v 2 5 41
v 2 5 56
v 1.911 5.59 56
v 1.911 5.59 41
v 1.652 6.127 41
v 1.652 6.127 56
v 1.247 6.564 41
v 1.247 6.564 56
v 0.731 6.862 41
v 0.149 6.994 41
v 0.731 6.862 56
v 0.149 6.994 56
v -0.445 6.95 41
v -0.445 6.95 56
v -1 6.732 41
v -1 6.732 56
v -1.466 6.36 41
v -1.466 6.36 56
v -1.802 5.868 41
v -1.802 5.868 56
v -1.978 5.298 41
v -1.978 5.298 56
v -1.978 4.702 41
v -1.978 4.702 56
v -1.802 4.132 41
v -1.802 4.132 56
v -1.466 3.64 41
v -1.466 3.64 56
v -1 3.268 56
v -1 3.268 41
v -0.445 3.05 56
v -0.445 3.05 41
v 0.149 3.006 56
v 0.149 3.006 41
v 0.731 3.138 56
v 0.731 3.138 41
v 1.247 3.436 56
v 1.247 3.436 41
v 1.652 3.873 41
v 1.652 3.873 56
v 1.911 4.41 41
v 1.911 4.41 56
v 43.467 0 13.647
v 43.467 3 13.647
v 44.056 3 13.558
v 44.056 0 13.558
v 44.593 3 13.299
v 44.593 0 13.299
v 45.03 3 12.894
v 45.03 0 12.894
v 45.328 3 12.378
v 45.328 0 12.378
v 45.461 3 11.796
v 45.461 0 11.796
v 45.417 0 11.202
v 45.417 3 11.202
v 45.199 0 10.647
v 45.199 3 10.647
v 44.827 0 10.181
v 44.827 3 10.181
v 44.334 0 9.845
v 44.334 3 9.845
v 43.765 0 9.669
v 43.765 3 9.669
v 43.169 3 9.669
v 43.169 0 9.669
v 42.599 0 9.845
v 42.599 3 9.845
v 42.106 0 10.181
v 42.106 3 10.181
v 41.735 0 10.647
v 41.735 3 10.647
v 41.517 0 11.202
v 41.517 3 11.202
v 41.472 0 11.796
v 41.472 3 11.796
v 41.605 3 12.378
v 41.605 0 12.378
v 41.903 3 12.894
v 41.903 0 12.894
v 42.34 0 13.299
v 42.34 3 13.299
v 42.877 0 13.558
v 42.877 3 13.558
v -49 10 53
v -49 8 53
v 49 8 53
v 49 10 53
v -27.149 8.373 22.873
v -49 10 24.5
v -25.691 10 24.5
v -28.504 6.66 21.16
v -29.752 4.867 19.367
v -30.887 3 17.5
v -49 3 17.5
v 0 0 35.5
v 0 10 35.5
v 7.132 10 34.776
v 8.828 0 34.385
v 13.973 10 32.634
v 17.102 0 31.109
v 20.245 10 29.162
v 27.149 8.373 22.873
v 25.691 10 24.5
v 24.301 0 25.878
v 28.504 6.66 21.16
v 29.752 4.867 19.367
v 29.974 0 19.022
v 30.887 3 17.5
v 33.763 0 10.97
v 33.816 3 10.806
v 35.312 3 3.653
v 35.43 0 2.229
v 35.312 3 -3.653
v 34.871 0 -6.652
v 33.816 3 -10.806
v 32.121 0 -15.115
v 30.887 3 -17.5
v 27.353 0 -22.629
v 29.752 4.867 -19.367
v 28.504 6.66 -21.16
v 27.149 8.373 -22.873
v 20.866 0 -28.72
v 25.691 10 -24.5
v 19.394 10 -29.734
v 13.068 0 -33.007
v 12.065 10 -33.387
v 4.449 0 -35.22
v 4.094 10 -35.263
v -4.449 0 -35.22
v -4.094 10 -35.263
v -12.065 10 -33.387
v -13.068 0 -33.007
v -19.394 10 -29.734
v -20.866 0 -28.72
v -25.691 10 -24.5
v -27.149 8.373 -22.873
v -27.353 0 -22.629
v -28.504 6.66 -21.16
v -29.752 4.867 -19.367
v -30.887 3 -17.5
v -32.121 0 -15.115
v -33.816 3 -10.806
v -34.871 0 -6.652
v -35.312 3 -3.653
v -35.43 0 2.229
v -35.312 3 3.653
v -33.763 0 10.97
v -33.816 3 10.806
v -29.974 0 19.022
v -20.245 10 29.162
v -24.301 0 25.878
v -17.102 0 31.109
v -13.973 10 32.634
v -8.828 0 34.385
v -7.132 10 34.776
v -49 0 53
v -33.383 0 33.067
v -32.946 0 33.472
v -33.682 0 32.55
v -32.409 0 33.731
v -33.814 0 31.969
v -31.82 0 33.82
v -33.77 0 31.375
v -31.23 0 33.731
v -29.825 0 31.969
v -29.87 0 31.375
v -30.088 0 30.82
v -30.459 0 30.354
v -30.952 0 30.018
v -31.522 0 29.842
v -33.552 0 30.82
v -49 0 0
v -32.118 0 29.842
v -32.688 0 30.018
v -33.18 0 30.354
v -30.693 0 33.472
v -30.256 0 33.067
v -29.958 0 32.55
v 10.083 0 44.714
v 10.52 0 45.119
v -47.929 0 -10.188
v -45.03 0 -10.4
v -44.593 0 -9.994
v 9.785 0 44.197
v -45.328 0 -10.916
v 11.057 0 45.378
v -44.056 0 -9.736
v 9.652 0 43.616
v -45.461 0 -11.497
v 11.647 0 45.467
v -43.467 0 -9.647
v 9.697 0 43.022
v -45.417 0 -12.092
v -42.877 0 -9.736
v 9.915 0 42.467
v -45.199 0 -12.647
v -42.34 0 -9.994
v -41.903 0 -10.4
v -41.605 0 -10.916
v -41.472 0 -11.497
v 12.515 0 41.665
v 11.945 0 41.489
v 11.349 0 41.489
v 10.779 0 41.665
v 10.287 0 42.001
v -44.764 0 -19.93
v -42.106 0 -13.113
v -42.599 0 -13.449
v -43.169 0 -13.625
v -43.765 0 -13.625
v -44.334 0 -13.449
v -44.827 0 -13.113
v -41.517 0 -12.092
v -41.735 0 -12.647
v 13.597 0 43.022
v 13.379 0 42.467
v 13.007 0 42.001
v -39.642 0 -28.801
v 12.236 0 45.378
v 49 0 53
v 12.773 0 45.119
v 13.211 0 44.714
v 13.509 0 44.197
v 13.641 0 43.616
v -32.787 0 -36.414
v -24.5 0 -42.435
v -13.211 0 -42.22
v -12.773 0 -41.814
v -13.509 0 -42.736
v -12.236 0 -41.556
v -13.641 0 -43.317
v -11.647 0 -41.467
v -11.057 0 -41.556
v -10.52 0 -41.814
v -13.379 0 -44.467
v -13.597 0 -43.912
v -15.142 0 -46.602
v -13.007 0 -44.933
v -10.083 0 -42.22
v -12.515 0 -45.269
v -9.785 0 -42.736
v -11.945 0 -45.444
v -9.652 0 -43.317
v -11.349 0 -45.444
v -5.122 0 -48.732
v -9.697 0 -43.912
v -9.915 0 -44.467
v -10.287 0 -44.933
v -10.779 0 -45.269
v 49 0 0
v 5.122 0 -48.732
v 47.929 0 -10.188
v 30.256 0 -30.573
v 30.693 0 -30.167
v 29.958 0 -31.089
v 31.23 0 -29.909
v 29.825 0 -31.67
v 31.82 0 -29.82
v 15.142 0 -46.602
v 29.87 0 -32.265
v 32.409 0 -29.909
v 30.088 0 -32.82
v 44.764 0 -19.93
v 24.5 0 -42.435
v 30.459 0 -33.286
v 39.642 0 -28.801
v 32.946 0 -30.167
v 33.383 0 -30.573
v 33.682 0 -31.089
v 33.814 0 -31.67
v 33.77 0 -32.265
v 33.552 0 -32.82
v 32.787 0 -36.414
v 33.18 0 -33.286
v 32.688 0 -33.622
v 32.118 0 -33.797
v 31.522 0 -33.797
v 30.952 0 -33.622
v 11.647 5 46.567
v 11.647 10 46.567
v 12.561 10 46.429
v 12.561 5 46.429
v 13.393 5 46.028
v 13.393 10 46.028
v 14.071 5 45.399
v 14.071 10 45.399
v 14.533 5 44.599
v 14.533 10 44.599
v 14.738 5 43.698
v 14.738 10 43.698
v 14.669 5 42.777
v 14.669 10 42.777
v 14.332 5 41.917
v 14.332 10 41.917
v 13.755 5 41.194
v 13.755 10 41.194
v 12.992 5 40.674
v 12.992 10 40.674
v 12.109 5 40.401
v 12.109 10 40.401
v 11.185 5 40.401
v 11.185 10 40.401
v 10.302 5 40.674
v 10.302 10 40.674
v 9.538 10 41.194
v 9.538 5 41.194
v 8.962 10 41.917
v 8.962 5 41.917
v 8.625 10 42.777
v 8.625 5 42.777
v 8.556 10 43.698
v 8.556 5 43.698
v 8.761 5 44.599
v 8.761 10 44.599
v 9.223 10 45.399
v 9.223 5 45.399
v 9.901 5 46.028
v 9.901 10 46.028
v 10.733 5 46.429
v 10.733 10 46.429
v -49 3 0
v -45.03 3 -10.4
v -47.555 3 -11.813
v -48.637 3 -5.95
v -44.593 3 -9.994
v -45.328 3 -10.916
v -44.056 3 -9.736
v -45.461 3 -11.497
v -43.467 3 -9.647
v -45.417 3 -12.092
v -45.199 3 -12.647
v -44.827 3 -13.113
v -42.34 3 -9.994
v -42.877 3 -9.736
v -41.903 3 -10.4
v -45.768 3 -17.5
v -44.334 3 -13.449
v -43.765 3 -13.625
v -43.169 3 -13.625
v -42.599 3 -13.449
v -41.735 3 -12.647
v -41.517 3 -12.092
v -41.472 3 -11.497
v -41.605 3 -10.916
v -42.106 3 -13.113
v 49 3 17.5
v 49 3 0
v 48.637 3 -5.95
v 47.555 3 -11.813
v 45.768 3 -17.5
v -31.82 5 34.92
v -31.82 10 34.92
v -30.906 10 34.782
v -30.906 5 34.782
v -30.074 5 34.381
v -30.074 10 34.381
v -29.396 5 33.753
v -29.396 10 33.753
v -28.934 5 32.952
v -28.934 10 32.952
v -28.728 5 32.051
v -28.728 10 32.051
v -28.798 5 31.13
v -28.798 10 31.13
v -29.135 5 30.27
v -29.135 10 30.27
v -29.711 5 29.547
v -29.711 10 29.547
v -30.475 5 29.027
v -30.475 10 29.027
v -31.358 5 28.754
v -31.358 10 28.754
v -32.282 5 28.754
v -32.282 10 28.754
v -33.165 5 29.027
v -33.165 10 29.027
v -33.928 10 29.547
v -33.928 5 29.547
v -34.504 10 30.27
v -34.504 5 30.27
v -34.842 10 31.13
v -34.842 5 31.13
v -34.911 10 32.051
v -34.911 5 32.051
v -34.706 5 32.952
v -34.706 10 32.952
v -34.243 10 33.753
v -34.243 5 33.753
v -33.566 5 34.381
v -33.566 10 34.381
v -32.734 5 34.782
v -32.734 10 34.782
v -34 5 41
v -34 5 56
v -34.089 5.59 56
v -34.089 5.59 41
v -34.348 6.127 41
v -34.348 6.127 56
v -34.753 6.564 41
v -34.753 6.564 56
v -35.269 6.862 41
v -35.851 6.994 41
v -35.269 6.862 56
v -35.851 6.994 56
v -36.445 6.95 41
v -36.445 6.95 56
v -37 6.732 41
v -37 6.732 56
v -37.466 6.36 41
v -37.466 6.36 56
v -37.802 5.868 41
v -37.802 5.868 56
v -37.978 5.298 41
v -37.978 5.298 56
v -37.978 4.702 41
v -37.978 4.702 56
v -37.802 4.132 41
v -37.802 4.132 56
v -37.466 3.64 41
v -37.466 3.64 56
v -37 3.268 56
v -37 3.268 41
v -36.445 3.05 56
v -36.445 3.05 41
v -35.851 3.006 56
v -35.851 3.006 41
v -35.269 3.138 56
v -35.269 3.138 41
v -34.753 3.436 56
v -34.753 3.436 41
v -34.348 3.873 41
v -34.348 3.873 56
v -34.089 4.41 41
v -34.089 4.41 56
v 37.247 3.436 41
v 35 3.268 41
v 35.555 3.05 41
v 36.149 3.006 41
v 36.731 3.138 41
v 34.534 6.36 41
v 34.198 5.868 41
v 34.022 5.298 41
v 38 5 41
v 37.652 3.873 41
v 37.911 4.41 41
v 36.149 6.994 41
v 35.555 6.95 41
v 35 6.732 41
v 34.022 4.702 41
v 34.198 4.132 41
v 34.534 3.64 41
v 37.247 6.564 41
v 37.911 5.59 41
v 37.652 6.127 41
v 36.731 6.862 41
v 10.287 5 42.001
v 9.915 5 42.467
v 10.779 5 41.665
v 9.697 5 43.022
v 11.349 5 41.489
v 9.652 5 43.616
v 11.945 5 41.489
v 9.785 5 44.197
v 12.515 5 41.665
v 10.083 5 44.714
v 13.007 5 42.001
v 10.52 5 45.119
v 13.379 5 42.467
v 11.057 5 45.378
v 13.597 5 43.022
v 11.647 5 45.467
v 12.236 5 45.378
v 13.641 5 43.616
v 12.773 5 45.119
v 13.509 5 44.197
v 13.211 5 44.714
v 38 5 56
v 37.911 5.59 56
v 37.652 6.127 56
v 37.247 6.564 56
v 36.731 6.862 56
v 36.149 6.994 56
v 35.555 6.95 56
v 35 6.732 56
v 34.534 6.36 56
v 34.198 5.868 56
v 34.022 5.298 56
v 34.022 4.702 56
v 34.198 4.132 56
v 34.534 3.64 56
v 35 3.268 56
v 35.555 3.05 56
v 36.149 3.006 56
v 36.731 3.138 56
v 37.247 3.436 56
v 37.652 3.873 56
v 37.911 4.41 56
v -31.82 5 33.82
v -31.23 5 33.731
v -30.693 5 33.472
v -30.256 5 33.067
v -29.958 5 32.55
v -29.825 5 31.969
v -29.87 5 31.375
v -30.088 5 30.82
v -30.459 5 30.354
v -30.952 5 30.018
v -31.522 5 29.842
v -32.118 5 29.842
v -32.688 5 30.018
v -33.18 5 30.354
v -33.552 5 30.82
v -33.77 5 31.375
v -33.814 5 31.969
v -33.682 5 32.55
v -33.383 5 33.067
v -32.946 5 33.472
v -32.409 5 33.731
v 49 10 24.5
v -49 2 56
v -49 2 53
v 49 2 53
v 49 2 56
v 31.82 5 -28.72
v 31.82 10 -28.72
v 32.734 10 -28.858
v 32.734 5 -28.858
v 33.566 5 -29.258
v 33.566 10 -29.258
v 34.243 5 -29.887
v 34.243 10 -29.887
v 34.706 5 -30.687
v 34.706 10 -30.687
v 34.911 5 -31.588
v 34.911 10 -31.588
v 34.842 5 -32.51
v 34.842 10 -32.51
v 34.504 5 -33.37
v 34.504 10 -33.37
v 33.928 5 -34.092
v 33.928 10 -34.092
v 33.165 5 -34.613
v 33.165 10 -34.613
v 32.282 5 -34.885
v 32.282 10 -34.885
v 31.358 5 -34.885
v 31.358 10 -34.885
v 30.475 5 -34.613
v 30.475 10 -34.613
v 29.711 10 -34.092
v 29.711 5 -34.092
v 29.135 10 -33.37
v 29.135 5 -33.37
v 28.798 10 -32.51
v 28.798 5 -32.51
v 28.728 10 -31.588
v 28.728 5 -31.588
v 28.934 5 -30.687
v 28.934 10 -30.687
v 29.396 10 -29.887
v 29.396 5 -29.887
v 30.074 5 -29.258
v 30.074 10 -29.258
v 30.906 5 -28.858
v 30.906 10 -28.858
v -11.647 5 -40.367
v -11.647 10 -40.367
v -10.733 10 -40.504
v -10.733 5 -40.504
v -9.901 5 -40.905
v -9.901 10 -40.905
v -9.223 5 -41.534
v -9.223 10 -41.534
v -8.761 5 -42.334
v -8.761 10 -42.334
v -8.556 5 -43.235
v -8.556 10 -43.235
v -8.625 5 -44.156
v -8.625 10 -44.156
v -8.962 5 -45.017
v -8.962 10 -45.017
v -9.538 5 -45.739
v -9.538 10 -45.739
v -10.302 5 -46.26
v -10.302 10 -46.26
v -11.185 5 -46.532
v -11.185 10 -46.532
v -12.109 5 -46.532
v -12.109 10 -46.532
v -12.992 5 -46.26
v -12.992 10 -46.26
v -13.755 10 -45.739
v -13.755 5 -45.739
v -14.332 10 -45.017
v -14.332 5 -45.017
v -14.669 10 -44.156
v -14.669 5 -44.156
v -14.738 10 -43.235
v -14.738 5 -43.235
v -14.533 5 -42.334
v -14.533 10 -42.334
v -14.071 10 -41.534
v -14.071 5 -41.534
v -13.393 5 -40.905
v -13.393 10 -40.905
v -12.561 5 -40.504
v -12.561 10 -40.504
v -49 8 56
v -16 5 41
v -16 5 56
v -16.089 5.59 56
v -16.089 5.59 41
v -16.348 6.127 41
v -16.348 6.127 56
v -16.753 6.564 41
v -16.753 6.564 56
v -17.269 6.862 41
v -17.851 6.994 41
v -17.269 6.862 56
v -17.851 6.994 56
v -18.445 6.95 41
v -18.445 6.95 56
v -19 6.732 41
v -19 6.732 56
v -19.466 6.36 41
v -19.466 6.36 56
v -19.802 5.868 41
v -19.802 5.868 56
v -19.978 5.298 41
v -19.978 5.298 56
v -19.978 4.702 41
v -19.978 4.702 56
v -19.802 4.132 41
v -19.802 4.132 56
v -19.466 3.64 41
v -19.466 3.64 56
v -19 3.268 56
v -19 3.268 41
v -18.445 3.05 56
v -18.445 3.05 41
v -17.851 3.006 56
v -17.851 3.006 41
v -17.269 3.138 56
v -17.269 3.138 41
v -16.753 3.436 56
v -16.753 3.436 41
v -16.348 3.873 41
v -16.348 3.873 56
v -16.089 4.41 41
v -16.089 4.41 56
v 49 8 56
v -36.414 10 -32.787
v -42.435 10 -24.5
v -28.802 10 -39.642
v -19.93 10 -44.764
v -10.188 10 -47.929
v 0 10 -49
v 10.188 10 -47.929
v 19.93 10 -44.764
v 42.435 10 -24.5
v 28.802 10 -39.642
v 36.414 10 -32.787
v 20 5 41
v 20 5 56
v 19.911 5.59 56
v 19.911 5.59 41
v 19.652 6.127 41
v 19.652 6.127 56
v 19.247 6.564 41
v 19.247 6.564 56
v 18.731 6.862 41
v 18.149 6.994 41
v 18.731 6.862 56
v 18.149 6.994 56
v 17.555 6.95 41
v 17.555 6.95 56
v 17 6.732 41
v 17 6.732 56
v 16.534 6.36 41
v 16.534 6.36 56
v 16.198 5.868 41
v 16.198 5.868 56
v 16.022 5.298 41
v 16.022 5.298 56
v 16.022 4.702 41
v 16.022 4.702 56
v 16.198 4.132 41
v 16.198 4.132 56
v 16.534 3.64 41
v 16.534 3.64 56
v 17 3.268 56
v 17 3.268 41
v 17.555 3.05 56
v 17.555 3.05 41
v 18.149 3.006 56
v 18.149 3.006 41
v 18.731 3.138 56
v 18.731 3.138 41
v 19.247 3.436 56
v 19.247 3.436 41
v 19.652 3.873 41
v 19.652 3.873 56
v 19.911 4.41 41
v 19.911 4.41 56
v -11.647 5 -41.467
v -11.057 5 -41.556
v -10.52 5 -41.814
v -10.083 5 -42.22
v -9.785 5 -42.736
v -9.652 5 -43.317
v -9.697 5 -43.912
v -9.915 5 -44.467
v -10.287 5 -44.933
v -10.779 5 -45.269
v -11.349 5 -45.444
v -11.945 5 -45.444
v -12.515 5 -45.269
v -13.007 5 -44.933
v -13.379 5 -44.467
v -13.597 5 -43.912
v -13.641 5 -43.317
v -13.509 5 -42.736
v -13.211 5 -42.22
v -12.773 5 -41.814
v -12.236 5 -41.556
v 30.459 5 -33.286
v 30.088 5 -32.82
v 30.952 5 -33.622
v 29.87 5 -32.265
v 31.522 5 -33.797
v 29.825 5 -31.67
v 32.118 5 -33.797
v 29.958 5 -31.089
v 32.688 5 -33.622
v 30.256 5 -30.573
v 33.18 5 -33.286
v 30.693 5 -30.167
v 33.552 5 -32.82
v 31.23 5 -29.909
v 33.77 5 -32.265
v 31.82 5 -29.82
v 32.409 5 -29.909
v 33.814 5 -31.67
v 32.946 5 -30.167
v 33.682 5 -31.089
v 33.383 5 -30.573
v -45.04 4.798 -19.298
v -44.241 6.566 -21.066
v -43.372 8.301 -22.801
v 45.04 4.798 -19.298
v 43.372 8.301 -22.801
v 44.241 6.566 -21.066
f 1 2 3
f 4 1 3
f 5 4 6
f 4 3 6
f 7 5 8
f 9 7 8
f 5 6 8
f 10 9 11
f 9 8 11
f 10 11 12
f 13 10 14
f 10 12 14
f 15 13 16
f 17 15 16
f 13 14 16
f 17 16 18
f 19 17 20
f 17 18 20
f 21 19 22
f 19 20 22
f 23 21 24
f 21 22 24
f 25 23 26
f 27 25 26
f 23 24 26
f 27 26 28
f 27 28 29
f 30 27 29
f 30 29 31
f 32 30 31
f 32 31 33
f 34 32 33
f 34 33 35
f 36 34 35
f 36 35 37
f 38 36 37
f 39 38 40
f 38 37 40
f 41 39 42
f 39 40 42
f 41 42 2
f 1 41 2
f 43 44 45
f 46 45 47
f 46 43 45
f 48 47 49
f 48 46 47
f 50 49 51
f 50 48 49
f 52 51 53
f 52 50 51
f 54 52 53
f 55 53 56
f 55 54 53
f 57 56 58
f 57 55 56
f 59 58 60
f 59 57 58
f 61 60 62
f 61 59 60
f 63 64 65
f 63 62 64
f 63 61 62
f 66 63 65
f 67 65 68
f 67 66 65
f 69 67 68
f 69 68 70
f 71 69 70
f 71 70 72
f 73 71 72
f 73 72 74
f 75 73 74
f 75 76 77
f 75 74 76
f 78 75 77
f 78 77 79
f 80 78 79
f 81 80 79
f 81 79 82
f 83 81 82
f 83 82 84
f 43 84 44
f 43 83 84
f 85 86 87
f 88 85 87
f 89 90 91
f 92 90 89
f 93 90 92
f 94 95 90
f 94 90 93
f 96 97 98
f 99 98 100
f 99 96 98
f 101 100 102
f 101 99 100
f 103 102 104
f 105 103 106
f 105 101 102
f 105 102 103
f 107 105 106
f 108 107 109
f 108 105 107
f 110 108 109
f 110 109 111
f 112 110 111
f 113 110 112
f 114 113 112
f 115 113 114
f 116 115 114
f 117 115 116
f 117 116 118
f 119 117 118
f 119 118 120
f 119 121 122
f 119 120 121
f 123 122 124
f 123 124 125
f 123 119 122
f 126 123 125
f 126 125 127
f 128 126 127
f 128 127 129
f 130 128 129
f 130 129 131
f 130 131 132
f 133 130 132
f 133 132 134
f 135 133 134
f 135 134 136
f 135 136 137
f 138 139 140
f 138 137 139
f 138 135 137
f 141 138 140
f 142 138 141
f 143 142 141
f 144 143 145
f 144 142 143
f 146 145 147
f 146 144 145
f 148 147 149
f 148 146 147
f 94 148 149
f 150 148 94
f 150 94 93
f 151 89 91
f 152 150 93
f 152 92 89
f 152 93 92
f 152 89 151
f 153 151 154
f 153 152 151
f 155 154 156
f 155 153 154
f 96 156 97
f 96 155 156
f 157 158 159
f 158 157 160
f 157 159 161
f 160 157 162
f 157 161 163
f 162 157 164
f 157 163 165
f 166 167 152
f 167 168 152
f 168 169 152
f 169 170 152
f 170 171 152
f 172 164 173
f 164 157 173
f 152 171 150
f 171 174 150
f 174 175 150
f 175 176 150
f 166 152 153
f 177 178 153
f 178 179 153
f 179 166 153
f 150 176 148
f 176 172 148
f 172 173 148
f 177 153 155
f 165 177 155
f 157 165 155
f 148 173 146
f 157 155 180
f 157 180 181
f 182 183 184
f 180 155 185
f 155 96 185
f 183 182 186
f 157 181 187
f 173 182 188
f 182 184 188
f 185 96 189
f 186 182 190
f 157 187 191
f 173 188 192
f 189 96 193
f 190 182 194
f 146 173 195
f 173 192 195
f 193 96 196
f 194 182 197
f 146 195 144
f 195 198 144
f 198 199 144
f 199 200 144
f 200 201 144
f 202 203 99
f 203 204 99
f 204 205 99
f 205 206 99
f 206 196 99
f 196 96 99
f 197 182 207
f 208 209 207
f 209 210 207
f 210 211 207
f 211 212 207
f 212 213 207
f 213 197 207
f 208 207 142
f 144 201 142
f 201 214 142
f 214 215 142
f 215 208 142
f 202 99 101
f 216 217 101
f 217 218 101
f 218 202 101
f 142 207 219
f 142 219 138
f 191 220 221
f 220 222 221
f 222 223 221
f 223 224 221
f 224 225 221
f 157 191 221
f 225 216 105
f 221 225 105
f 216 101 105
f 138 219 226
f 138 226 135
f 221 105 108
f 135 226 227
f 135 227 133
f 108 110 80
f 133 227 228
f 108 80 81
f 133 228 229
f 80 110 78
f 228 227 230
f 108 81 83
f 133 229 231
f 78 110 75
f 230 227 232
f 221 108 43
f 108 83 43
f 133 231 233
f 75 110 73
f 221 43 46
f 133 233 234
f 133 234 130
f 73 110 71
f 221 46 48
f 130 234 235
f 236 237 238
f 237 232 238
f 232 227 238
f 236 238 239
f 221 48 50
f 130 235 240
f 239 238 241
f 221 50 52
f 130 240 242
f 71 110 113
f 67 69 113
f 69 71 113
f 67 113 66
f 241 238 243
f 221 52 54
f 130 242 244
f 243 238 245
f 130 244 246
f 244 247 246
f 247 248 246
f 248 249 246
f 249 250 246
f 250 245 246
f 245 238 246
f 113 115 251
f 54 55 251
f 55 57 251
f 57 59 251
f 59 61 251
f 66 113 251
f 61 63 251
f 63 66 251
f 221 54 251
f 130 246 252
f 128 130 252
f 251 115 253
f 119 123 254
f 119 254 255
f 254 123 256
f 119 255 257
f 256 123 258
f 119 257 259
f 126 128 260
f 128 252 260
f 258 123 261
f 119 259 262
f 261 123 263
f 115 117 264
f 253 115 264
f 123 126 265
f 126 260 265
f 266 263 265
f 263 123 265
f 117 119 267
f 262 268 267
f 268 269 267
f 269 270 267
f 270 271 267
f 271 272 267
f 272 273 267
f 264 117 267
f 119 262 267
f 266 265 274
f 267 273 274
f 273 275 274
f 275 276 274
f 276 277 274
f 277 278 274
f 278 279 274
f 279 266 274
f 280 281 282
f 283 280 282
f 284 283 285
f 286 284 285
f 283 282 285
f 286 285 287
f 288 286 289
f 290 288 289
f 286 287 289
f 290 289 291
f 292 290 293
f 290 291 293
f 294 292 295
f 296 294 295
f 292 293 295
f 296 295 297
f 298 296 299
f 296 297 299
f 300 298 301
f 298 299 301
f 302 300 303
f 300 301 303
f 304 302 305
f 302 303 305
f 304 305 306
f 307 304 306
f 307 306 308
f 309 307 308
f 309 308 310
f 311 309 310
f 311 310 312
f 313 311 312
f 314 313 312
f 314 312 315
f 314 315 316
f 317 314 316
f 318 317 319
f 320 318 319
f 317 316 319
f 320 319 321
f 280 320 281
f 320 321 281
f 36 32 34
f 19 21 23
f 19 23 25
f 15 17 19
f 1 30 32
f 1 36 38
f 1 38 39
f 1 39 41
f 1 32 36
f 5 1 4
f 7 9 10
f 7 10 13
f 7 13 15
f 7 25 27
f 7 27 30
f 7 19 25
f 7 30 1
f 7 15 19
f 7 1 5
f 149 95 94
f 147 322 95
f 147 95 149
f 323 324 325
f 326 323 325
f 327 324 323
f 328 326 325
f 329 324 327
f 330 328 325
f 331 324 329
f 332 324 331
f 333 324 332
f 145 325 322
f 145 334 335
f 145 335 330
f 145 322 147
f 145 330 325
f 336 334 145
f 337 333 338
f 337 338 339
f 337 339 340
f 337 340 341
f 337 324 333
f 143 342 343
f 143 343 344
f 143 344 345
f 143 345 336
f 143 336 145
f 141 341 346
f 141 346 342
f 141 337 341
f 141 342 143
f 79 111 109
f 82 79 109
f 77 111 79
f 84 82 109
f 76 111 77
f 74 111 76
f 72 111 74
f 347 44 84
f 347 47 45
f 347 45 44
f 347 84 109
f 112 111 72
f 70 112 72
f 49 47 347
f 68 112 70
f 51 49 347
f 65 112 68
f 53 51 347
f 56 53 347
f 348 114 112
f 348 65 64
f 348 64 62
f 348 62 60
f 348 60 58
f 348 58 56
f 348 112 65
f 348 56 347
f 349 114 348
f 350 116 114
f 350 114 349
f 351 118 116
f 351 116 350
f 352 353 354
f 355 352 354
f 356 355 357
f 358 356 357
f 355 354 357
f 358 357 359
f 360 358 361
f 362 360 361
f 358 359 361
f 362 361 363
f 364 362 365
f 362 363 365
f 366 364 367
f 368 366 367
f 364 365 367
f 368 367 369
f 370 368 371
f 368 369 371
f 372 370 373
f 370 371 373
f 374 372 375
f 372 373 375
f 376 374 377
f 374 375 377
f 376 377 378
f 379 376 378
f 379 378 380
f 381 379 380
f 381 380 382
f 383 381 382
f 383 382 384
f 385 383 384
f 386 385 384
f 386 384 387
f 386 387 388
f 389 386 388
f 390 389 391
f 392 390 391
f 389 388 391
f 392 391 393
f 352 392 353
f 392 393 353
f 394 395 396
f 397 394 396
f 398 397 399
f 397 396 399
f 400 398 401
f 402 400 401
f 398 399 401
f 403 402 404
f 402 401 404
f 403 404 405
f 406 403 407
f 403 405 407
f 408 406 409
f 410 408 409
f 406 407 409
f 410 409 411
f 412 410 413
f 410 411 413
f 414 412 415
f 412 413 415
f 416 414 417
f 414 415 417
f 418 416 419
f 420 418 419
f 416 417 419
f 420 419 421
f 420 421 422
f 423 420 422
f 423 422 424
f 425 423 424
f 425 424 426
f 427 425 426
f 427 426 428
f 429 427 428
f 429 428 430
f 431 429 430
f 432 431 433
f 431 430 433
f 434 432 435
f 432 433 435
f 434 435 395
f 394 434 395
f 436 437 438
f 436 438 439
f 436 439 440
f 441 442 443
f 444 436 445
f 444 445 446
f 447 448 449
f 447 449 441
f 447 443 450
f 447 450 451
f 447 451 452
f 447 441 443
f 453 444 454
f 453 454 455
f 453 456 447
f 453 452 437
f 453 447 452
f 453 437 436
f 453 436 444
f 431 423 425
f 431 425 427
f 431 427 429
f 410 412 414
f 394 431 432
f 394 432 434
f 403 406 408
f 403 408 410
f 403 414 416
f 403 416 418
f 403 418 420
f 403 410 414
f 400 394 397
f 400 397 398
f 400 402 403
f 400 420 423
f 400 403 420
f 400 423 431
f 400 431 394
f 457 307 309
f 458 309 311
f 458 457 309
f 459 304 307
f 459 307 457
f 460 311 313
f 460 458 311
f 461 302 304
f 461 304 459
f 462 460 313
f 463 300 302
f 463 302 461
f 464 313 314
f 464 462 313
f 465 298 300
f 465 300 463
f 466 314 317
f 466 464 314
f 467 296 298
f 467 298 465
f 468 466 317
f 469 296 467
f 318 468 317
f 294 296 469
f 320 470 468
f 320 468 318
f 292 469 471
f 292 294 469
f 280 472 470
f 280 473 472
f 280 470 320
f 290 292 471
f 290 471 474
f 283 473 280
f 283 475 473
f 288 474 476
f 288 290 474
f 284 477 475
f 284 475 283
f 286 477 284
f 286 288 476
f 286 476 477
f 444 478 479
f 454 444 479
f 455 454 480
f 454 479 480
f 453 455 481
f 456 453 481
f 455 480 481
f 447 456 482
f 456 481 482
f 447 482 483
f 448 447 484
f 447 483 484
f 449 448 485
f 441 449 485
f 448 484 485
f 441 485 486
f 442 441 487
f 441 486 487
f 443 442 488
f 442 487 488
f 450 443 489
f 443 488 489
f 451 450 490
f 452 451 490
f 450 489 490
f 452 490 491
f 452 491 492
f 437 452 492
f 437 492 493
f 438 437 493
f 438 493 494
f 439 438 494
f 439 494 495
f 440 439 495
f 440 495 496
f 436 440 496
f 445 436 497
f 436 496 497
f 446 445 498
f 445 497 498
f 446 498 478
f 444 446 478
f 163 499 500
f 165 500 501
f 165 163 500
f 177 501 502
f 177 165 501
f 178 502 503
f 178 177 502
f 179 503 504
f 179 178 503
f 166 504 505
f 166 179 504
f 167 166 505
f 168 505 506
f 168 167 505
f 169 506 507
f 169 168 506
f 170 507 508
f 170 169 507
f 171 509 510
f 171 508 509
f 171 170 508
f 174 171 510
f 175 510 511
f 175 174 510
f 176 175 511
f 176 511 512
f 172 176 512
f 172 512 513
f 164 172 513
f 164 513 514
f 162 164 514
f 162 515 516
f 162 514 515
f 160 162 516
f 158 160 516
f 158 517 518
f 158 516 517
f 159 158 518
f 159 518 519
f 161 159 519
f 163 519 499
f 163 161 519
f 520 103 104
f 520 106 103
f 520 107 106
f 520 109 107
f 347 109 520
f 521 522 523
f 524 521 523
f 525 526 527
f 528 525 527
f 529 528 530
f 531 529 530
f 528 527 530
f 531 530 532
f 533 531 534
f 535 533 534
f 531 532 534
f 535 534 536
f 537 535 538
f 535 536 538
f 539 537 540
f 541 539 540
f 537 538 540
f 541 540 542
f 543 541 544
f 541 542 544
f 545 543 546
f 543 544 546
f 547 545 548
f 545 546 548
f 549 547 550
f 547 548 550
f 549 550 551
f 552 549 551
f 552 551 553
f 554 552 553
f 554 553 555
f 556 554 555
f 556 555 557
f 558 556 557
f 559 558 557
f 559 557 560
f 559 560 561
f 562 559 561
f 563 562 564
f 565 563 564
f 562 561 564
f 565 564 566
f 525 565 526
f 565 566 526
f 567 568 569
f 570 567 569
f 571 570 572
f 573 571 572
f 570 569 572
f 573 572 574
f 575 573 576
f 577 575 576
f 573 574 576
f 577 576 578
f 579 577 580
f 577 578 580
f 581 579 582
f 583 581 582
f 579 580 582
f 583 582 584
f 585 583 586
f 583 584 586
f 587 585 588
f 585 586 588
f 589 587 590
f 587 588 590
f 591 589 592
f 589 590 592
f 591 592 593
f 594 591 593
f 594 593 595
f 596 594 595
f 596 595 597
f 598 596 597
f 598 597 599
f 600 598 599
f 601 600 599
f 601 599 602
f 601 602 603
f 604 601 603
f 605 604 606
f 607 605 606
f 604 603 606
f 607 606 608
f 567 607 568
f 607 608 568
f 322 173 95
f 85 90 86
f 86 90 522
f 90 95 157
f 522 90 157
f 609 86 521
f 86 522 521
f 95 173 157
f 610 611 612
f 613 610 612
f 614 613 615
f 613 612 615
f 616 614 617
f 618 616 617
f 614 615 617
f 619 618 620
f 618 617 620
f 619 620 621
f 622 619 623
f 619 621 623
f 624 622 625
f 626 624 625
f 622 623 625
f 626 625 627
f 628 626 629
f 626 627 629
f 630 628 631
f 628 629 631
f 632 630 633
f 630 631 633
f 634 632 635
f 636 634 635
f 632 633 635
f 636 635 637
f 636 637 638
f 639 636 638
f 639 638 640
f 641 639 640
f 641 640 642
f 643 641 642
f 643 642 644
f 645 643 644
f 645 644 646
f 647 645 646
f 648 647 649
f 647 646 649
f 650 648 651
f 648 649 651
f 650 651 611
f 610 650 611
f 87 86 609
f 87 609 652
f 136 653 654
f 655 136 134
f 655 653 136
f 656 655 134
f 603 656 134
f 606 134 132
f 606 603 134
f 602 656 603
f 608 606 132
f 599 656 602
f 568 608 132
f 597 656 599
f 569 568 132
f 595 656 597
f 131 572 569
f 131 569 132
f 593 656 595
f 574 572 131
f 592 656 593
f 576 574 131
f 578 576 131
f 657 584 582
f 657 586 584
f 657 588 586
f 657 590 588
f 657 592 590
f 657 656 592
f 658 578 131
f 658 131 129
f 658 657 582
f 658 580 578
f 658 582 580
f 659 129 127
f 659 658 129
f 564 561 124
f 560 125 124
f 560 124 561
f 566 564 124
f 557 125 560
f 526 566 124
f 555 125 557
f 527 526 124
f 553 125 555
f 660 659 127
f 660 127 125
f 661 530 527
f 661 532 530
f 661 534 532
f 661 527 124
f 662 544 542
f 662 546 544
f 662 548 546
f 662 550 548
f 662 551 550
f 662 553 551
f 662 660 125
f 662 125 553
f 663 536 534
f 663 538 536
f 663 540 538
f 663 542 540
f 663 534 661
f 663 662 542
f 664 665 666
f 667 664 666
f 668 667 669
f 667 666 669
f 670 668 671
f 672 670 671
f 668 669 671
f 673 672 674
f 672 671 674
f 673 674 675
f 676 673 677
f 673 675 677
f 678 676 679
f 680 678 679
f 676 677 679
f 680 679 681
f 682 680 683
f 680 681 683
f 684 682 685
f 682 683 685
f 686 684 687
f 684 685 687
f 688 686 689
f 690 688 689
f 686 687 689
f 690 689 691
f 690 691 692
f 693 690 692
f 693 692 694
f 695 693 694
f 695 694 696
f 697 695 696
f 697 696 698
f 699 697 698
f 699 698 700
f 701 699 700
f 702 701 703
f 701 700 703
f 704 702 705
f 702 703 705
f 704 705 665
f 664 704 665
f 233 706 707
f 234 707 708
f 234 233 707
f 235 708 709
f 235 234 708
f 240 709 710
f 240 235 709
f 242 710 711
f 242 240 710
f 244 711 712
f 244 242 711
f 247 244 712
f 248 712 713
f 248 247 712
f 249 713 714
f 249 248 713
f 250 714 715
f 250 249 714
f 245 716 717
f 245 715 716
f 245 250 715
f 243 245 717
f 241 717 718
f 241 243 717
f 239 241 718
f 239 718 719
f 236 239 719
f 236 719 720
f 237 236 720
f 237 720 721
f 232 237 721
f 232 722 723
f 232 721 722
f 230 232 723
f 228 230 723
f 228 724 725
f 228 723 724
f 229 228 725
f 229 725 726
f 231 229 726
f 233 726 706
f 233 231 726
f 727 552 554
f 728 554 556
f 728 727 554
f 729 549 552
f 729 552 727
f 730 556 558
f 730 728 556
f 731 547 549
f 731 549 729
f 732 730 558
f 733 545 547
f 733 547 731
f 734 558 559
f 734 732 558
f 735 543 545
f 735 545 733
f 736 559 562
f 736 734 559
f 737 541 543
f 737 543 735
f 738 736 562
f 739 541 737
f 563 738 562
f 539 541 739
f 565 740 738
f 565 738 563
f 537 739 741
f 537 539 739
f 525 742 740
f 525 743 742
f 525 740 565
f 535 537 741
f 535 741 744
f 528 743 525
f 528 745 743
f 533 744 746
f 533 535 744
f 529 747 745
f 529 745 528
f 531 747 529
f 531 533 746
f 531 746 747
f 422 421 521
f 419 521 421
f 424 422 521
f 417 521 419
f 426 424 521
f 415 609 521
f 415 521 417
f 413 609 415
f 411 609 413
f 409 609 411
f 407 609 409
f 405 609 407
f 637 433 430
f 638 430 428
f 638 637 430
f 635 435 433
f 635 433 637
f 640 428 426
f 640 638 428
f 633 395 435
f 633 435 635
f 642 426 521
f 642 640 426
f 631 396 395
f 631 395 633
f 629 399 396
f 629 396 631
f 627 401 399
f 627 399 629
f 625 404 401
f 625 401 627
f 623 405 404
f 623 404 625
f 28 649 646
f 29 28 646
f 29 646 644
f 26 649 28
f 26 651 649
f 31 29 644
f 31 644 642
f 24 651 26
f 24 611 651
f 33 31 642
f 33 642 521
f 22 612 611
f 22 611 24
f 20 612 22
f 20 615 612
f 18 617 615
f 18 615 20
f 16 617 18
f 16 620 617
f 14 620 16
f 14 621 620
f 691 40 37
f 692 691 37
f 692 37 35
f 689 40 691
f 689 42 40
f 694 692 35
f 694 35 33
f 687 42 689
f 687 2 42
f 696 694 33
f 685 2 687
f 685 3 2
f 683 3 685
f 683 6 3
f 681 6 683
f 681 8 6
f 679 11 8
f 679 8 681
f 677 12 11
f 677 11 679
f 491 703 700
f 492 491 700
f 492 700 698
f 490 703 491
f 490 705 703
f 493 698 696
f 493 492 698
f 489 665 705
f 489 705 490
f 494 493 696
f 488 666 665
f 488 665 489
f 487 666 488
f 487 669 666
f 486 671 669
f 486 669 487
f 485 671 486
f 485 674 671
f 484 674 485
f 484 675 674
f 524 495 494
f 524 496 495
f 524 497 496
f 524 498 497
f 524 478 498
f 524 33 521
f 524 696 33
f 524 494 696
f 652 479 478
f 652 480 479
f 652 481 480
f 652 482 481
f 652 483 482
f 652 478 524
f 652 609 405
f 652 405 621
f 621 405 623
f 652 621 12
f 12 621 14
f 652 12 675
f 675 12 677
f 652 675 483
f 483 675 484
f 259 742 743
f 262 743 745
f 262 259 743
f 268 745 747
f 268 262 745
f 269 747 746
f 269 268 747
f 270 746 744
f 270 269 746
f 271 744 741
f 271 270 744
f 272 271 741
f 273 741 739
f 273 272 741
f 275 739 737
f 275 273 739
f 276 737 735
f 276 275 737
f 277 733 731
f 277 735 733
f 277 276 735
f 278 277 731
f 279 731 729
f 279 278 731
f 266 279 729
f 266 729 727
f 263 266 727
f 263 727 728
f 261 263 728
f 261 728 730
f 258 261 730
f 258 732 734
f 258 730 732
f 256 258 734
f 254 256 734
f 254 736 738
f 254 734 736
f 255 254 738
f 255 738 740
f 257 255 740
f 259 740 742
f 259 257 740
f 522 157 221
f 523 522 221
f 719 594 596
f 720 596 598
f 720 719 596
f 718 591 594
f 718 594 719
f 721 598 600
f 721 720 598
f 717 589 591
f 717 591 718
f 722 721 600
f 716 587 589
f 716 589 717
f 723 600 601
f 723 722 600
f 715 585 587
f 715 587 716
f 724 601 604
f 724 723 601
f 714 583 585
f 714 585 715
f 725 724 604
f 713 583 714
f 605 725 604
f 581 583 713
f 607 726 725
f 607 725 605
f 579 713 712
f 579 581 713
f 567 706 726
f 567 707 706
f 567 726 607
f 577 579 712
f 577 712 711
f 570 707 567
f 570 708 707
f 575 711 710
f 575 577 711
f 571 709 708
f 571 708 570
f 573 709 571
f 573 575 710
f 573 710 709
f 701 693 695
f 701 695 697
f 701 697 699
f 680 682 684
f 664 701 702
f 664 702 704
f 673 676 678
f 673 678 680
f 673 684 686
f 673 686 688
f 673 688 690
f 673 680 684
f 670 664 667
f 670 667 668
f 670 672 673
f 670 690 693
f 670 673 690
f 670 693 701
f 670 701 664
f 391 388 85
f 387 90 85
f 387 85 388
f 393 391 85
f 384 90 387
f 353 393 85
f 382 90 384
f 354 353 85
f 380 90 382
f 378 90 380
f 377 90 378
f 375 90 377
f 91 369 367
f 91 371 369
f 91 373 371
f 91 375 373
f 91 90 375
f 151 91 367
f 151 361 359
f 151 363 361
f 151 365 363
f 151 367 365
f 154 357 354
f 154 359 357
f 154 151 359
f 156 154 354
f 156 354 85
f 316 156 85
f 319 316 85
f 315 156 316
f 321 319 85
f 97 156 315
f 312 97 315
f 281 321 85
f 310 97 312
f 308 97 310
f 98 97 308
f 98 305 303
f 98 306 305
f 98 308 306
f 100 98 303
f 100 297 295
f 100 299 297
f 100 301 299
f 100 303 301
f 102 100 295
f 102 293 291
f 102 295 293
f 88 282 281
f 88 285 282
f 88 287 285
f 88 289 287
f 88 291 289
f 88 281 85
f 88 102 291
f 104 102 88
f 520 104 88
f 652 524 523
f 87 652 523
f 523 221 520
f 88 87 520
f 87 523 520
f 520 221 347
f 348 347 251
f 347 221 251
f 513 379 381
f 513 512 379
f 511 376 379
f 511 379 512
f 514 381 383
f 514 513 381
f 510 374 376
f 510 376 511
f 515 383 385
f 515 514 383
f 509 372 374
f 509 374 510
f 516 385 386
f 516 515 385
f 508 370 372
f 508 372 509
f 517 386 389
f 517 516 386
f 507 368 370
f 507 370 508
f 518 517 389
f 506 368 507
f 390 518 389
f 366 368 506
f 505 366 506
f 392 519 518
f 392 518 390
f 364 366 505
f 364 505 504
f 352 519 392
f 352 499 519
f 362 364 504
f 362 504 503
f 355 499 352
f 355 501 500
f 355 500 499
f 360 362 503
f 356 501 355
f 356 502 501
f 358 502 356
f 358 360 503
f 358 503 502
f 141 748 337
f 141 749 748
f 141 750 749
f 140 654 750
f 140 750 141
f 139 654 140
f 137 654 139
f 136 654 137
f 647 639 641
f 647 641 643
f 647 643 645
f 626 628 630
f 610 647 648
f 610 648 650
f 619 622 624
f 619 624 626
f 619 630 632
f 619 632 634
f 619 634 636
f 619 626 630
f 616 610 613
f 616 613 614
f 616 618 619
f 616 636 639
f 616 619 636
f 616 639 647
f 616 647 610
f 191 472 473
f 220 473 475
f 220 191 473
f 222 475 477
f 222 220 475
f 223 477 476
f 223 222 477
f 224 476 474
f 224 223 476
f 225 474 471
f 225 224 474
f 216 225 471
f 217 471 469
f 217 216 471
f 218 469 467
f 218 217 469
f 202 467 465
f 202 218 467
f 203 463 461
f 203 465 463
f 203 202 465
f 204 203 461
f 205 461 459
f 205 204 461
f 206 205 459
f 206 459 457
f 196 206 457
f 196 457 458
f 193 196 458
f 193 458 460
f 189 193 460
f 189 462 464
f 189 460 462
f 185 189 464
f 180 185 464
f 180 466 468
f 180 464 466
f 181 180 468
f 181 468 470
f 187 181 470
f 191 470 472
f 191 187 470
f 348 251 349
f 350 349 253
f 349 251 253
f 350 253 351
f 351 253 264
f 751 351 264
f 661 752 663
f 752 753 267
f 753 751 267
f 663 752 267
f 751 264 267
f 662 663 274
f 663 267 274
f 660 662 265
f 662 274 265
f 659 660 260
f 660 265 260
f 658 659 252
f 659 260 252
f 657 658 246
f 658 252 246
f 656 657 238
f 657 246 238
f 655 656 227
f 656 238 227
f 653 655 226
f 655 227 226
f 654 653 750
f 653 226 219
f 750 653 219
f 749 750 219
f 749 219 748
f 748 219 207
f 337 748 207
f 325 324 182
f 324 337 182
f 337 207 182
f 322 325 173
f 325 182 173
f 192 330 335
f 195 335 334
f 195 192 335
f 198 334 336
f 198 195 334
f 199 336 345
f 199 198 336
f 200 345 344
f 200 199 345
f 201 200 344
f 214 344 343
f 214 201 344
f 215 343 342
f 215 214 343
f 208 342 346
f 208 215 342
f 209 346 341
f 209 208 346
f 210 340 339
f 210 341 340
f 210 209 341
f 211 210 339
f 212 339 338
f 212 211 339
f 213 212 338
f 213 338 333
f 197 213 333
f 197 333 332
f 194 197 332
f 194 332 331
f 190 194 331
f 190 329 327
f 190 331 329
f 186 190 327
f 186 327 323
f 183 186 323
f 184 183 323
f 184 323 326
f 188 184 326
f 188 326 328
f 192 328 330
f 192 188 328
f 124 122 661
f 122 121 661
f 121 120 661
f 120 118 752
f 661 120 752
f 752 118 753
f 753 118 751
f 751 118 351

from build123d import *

# Parameters (mm, degrees)
SKETCH_1_R           = 35.5
SKETCH_1_R_2         = 2
EXTRUDE_4_DEPTH      = 10
SKETCH_24_W          = 98
SKETCH_24_H          = 6
EXTRUDE_5_DEPTH      = 3
SKETCH_26_W          = 98
SKETCH_26_H          = 35
CUT_EXTRUDE_17_DEPTH = 7
CHAMFER_1_SIZE       = 7
SKETCH_27_R          = 3.1
CUT_EXTRUDE_18_DEPTH = 5
SKETCH_28_R          = 2
CUT_EXTRUDE_19_DEPTH = 15


with BuildPart() as part:
    # 스케치1 → 보스-돌출4 (new body)
    with BuildSketch(Plane(origin=(0, 0, 0), x_dir=(1, 0, 0), z_dir=(0, 1, 0))):
        with BuildLine():
            Line((-49, 0), (-49, -53))
            Line((-49, -53), (49, -53))
            Line((49, -53), (49, 0))
            ThreePointArc((49, 0), (0, 49), (-49, 0))
        make_face()
        with Locations(Location((0, 0, 0), (0, 0, 270))):
            Circle(SKETCH_1_R, mode=Mode.SUBTRACT)
        with Locations(Location((-43.466662183, 11.64685703, 0), (0, 0, 270))):
            Circle(SKETCH_1_R_2, mode=Mode.SUBTRACT)
        with Locations(Location((-11.64685703, 43.466662183, 0), (0, 0, 270))):
            Circle(SKETCH_1_R_2, mode=Mode.SUBTRACT)
        with Locations(Location((31.819805153, 31.819805153, 0), (0, 0, 270))):
            Circle(SKETCH_1_R_2, mode=Mode.SUBTRACT)
        with Locations(Location((43.466662183, -11.64685703, 0), (0, 0, 270))):
            Circle(SKETCH_1_R_2, mode=Mode.SUBTRACT)
        with Locations(Location((11.64685703, -43.466662183, 0), (0, 0, 270))):
            Circle(SKETCH_1_R_2, mode=Mode.SUBTRACT)
        with Locations(Location((-31.819805153, -31.819805153, 0), (0, 0, 270))):
            Circle(SKETCH_1_R_2, mode=Mode.SUBTRACT)
    extrude(amount=EXTRUDE_4_DEPTH)

    # 스케치24 → 보스-돌출5 (add)
    with BuildSketch(Plane.XY.offset(53)):
        with Locations((0, 5)):
            Rectangle(SKETCH_24_W, SKETCH_24_H)
    extrude(amount=EXTRUDE_5_DEPTH)

    # 스케치26 → 컷-돌출17 (cut)
    with BuildSketch(Plane(origin=(0, 10, 0), x_dir=(1, 0, 0), z_dir=(0, 1, 0))):
        Rectangle(SKETCH_26_W, SKETCH_26_H)
    extrude(amount=-CUT_EXTRUDE_17_DEPTH, mode=Mode.SUBTRACT)

    # 모따기1
    chamfer_1_edges = [part.edges().sort_by_distance(p)[0] for p in [
        (-39.943445211, 10, 17.5),
        (39.943445211, 10, 17.5),
        (38.327664665, 10, -17.5),
        (-38.327664665, 10, -17.5),
    ]]
    chamfer(chamfer_1_edges, length=CHAMFER_1_SIZE - 0.0001)  # a hair under: the kernel refuses the full size

    # 스케치27 → 컷-돌출18 (cut)
    with BuildSketch(Plane(origin=(0, 10, 0), x_dir=(1, 0, 0), z_dir=(0, 1, 0))):
        with Locations(Location((-11.64685703, 43.466662183, 0), (0, 0, 270))):
            Circle(SKETCH_27_R)
        with Locations(Location((31.819805153, 31.819805153, 0), (0, 0, 270))):
            Circle(SKETCH_27_R)
        with Locations((43.466662183, -11.64685703)):
            Circle(SKETCH_27_R)
        with Locations(Location((11.64685703, -43.466662183, 0), (0, 0, 270))):
            Circle(SKETCH_27_R)
        with Locations(Location((-31.819805153, -31.819805153, 0), (0, 0, 270))):
            Circle(SKETCH_27_R)
        with Locations((-43.466662183, 11.64685703)):
            Circle(SKETCH_27_R)
    extrude(amount=-CUT_EXTRUDE_18_DEPTH, mode=Mode.SUBTRACT)

    # 스케치28 → 컷-돌출19 (cut)
    with BuildSketch(Plane.XY.offset(56)):
        with Locations((-36, 5)):
            Circle(SKETCH_28_R)
        with Locations((-18, 5)):
            Circle(SKETCH_28_R)
        with Locations((0, 5)):
            Circle(SKETCH_28_R)
        with Locations((18, 5)):
            Circle(SKETCH_28_R)
        with Locations((36, 5)):
            Circle(SKETCH_28_R)
    extrude(amount=-CUT_EXTRUDE_19_DEPTH, mode=Mode.SUBTRACT)


solid = part.part
